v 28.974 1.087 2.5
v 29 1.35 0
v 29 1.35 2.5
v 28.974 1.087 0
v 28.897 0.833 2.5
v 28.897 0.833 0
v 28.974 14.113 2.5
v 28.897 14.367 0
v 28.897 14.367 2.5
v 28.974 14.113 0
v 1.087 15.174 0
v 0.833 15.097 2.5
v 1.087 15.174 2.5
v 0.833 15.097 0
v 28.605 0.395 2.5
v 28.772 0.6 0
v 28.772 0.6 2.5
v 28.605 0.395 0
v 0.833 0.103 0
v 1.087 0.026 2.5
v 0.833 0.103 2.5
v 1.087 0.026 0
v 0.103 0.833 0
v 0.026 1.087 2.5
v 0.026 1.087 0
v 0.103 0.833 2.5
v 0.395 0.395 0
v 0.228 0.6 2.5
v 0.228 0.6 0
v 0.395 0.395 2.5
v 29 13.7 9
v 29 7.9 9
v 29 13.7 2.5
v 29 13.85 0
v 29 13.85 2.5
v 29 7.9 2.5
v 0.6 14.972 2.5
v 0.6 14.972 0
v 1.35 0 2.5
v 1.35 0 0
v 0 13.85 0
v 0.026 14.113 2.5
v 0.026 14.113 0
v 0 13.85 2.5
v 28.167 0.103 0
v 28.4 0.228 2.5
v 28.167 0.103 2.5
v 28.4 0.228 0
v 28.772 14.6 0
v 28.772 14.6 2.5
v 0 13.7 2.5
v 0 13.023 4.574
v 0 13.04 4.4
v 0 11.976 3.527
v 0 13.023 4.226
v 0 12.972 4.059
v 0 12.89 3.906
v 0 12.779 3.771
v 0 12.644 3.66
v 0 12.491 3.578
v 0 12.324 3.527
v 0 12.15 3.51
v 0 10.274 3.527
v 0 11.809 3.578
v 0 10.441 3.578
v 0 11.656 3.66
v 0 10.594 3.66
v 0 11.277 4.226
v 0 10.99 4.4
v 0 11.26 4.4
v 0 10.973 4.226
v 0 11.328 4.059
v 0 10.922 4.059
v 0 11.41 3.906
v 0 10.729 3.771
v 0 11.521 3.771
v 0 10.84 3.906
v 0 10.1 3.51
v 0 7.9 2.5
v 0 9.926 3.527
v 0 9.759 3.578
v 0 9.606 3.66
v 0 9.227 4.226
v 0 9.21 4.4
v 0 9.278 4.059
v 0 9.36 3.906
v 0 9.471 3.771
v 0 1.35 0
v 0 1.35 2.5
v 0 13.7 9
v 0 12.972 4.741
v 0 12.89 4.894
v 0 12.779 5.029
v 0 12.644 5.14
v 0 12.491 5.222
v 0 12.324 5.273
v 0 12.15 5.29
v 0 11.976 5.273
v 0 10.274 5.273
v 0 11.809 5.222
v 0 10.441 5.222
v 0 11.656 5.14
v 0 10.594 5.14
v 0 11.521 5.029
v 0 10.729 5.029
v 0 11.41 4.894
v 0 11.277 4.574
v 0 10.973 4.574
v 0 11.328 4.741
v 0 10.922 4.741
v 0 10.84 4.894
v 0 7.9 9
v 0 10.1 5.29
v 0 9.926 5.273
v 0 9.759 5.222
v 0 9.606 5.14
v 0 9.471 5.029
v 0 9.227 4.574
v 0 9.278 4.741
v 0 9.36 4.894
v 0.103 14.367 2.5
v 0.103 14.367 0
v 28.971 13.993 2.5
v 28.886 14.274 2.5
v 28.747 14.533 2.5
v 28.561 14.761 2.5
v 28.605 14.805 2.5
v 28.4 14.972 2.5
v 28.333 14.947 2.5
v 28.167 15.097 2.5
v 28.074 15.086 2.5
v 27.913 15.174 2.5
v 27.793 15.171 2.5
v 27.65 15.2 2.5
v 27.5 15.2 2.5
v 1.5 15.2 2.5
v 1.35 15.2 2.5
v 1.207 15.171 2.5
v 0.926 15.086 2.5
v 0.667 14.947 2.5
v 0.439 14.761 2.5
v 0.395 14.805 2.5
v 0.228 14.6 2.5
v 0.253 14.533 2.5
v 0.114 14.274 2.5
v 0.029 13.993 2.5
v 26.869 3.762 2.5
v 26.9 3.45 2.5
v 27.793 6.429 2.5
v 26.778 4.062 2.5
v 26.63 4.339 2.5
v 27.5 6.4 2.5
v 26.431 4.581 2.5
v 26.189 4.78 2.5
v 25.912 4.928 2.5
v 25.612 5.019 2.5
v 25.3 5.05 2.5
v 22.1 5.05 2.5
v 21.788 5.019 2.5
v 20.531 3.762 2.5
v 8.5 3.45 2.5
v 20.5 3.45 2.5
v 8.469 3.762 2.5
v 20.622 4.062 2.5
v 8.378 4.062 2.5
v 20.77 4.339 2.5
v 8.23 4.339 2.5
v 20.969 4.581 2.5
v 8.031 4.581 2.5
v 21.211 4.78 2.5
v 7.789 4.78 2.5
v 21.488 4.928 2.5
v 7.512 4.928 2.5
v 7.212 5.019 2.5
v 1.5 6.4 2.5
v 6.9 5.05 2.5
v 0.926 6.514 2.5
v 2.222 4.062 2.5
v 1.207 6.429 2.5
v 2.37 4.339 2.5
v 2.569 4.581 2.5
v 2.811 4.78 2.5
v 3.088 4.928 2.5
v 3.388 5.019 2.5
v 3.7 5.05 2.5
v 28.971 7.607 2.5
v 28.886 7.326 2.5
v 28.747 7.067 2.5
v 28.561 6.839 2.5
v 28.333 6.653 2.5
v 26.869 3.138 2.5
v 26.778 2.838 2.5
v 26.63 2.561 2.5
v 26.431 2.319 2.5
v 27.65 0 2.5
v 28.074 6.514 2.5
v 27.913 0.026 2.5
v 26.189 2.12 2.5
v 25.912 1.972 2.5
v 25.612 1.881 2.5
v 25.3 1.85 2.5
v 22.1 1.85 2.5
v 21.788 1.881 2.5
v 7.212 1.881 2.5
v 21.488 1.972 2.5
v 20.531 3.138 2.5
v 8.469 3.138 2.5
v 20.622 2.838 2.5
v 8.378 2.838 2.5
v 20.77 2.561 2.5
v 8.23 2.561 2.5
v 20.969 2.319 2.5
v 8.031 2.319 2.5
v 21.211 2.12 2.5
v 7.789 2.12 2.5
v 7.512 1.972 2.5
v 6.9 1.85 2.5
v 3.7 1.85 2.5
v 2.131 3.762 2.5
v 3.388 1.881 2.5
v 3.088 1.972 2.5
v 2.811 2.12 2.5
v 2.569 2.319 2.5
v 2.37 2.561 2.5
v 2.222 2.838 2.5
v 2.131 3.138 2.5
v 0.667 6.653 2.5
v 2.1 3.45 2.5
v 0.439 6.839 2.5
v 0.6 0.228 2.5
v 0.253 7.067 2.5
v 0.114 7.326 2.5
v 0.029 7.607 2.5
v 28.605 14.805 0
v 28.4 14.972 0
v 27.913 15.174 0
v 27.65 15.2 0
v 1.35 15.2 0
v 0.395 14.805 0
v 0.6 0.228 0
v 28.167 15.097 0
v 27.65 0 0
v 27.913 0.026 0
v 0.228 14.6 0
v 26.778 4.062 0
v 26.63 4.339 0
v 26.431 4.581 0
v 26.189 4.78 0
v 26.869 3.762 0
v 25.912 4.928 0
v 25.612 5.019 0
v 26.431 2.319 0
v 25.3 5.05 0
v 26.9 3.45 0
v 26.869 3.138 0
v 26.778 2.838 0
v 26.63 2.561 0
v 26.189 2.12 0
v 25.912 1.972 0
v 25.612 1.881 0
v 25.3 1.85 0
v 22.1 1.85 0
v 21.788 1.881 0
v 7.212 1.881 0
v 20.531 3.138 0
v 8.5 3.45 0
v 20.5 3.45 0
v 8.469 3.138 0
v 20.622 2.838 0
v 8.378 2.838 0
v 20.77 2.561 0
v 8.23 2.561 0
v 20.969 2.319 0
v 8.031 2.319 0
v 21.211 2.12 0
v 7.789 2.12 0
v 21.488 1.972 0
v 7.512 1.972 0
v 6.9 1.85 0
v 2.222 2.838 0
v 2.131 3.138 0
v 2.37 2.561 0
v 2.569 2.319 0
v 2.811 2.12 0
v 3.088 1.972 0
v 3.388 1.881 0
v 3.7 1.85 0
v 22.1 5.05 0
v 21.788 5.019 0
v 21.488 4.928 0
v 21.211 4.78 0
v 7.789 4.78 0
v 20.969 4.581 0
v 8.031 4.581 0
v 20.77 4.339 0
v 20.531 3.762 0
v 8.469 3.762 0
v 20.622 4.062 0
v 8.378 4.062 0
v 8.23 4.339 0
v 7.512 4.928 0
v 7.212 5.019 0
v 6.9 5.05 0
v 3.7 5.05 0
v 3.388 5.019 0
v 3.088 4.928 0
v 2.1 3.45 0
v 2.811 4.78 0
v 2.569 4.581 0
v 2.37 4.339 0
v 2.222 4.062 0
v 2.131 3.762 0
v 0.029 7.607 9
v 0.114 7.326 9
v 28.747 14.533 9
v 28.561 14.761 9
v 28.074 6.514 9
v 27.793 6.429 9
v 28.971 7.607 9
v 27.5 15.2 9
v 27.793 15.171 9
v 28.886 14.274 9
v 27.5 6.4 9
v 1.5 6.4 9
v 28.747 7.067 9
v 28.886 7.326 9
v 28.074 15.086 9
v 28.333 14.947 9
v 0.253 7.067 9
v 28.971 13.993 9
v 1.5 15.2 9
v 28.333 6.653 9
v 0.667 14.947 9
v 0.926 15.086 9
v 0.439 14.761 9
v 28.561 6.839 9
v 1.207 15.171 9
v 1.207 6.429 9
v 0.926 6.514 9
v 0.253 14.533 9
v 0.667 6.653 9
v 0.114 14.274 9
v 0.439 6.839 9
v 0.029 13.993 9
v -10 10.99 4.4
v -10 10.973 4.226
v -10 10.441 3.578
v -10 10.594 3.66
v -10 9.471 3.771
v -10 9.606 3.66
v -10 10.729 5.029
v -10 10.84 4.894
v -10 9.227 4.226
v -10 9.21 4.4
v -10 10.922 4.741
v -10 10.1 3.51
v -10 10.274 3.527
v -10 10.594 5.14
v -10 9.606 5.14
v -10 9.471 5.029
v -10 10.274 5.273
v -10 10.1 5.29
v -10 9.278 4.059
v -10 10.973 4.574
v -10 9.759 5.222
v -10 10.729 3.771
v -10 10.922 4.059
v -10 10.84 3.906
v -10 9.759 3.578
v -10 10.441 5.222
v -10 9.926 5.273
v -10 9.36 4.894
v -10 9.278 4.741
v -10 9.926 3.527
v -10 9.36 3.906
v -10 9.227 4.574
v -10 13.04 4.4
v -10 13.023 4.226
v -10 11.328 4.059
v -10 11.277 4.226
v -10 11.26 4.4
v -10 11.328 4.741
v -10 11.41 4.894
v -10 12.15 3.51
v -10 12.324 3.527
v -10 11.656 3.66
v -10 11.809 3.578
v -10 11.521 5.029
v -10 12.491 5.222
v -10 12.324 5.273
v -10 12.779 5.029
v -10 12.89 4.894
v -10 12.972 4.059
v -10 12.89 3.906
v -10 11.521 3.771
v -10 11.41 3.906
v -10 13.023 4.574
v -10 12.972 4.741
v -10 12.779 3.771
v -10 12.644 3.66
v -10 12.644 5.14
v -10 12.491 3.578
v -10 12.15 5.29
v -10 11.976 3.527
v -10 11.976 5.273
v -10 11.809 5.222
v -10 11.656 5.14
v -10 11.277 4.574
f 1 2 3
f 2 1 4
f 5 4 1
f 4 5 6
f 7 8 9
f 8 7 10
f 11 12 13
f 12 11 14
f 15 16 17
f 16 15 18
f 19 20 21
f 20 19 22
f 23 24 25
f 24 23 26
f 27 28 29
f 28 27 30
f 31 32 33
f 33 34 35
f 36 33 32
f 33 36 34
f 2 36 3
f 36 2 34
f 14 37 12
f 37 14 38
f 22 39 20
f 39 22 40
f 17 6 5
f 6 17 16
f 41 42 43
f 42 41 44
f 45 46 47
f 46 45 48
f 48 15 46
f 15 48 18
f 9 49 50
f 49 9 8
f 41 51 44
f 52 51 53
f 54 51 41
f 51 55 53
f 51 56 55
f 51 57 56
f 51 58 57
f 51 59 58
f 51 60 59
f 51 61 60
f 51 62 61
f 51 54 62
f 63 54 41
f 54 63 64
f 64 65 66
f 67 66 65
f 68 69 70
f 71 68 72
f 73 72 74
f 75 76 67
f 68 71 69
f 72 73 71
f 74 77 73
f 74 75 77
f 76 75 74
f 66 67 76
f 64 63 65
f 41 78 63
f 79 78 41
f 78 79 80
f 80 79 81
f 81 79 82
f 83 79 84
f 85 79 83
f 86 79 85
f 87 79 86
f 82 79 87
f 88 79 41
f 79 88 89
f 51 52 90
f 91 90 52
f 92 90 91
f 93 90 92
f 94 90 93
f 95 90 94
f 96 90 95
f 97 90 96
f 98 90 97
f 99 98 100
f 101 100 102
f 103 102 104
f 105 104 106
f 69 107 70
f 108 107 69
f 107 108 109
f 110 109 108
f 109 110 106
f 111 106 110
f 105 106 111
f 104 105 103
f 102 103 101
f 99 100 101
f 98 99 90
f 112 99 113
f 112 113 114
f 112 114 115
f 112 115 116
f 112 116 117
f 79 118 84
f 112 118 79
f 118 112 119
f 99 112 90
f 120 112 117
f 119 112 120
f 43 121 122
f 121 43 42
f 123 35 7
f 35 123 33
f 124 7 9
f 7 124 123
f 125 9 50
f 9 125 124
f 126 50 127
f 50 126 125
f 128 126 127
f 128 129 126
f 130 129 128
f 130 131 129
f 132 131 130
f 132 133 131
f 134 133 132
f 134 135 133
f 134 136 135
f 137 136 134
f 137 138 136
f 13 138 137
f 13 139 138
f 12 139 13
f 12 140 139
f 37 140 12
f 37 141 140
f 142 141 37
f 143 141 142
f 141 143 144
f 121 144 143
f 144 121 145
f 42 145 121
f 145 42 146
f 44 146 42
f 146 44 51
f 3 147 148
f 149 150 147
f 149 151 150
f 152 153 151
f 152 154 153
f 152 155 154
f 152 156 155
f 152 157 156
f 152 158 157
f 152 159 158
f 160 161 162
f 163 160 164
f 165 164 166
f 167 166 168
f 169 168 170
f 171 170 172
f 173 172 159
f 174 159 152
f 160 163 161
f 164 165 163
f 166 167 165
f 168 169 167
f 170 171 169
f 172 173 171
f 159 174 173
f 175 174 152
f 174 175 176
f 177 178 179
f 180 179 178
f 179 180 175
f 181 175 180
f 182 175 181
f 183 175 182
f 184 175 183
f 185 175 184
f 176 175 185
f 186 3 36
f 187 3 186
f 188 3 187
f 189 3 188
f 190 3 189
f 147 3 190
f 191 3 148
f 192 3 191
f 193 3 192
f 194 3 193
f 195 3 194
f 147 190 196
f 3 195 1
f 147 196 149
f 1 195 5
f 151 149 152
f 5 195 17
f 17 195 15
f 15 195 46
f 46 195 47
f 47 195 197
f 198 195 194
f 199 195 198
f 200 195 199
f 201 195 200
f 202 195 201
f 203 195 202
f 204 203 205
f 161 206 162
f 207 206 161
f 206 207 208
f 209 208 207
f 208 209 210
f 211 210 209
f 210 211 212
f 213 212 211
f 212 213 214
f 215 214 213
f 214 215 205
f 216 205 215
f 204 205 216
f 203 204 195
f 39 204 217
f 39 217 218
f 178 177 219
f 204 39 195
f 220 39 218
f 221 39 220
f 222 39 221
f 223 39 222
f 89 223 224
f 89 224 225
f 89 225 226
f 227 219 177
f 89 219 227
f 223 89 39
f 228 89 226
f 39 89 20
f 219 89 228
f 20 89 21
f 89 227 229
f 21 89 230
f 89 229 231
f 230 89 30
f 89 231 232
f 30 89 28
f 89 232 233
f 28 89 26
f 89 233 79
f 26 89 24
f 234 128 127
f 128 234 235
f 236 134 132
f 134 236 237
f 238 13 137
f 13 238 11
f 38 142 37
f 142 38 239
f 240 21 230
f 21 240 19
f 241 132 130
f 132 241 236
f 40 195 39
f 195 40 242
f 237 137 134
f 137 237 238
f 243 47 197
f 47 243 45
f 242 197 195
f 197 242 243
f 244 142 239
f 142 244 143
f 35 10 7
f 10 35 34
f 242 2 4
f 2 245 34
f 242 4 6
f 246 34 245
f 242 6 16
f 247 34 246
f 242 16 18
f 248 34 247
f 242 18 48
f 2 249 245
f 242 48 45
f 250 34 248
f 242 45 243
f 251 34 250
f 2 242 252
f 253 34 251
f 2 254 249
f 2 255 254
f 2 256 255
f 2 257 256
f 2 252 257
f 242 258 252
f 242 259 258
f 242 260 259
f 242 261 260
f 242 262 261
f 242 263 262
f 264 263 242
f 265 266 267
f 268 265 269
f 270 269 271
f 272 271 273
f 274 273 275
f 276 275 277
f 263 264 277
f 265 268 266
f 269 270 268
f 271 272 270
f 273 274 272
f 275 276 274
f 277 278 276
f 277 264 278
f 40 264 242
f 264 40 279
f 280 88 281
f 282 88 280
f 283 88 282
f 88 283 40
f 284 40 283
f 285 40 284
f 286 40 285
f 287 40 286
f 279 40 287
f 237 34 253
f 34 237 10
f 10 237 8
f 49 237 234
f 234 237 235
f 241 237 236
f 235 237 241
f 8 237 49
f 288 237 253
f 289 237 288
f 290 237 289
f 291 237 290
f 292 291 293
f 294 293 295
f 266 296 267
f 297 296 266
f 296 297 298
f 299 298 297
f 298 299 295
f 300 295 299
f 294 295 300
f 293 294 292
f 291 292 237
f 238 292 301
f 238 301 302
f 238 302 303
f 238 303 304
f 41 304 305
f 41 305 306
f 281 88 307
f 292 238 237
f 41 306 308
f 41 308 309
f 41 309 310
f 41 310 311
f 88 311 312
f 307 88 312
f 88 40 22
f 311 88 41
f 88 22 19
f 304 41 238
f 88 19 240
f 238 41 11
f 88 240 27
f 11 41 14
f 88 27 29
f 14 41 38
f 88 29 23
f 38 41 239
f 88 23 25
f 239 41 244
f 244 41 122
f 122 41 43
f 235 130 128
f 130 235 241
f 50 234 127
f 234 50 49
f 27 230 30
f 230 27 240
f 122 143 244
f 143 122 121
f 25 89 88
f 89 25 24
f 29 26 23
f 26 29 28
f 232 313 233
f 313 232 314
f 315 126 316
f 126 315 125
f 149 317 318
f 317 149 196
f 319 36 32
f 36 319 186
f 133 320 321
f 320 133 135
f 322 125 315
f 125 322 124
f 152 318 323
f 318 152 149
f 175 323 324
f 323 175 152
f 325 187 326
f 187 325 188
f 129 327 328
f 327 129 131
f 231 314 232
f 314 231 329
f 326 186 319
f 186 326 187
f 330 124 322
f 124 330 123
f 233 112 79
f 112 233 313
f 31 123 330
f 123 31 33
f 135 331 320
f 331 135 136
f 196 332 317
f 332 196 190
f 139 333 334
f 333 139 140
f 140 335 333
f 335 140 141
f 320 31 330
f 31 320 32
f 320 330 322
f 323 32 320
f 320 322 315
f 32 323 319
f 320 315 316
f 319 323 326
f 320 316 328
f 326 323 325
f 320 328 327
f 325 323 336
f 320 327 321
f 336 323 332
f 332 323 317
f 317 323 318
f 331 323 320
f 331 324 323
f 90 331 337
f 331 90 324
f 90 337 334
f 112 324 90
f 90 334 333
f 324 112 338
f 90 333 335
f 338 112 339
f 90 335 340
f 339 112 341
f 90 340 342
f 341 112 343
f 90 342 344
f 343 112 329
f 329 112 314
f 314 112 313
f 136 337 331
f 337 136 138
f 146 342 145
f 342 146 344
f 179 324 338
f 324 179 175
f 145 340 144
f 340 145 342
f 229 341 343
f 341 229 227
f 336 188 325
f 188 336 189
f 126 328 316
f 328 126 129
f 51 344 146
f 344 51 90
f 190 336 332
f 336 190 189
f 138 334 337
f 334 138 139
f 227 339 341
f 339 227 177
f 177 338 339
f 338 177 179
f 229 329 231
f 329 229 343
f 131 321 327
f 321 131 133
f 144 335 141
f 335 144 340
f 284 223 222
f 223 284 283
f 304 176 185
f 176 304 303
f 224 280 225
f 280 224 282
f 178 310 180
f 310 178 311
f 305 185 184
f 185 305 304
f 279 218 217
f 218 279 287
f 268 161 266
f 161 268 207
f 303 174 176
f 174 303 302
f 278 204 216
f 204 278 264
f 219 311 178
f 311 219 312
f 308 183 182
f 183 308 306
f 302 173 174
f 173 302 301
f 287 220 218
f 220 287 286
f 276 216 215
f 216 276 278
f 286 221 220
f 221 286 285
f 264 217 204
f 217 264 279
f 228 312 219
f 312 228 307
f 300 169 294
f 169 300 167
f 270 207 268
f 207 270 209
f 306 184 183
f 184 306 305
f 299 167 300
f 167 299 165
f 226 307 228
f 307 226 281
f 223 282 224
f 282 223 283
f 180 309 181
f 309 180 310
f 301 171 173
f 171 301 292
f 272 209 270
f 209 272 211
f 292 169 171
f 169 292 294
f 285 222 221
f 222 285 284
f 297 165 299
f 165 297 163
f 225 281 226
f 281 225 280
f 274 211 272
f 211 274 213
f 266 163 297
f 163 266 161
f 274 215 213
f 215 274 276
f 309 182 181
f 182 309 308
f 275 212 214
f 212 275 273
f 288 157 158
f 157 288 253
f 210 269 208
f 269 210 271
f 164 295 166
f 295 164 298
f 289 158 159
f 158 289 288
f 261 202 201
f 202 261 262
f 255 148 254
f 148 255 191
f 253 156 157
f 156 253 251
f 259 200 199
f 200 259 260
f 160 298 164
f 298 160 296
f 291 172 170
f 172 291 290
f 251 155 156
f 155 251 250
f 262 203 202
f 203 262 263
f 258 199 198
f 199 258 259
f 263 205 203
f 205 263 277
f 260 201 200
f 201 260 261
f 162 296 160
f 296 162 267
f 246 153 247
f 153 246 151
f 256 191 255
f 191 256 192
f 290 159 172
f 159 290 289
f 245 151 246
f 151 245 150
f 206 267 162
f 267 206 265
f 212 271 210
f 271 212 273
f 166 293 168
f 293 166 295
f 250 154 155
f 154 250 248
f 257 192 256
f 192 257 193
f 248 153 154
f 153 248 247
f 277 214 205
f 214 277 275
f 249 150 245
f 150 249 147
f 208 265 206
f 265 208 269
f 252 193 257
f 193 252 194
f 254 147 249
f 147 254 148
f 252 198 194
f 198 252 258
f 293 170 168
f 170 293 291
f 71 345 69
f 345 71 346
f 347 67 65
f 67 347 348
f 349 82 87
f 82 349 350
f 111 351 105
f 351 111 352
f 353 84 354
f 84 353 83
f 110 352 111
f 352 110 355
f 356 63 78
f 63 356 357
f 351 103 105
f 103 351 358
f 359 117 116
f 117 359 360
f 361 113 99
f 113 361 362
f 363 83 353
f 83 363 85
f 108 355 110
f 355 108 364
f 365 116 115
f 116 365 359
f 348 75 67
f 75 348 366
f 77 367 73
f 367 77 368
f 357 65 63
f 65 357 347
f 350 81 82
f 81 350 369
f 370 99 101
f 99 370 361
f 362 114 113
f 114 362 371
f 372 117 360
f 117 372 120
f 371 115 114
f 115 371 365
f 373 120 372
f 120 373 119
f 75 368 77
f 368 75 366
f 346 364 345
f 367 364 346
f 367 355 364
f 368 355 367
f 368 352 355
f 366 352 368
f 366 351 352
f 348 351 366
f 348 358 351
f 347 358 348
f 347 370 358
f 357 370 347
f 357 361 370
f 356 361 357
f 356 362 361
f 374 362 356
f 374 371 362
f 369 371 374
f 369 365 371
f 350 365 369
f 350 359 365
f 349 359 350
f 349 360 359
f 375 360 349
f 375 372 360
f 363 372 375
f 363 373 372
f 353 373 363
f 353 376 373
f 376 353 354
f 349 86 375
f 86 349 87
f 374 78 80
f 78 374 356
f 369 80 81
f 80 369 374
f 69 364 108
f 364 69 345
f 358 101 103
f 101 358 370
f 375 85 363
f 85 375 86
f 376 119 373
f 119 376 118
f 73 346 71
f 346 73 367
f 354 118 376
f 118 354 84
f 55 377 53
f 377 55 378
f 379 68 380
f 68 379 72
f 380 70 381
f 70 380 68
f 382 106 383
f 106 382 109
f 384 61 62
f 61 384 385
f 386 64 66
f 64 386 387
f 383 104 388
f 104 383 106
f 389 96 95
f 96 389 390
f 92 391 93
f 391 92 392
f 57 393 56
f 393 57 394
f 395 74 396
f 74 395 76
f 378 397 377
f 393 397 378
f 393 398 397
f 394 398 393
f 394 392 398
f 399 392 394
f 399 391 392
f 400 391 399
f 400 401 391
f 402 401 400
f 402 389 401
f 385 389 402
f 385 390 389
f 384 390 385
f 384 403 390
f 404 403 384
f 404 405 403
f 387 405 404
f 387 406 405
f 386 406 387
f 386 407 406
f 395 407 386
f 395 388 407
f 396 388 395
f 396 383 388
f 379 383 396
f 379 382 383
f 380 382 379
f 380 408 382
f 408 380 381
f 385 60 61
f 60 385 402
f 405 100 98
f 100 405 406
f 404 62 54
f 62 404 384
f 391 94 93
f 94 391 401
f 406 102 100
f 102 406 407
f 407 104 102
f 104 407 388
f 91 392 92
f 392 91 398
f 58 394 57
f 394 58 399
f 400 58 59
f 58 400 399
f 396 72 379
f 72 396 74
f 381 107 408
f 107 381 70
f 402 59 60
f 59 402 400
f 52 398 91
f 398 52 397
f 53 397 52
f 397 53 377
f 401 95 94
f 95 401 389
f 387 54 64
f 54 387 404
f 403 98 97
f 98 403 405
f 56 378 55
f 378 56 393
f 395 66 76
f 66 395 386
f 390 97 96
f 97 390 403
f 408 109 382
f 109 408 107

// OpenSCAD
// SPDX-License-Identifier: CC0-1.0. Original reference model; see metadata.json.
// Local X follows the length. Both STL files share coordinates (do not recenter individually).
$fn=32; part="switch"; L=29; W=15.2; H=9; gap=4;
module rr(l,w,r,h){hull() for(x=[r,l-r],y=[r,w-r]) translate([x,y,0]) cylinder(r=r,h=h);}
module slot(){hull() for(x=[-1.6,1.6]) translate([x,0,-.1]) cylinder(r=1.6,h=3.2);}
module casehalf(){difference(){union(){rr(L,W,1.35,2.5); translate([0,6.4,0]) rr(L,W-6.4,1.5,H);} for(x=[5.3,L-5.3]) translate([x,3.45,0]) slot();}}
module wires(){for(y=[10.1,12.15]) translate([-10,y,4.4]) rotate([0,90,0]) cylinder(r=.89,h=10.7);}
if(part=="switch") union(){casehalf(); wires();}
if(part=="magnet") translate([0,W*2+gap,0]) mirror([0,1,0]) casehalf();
